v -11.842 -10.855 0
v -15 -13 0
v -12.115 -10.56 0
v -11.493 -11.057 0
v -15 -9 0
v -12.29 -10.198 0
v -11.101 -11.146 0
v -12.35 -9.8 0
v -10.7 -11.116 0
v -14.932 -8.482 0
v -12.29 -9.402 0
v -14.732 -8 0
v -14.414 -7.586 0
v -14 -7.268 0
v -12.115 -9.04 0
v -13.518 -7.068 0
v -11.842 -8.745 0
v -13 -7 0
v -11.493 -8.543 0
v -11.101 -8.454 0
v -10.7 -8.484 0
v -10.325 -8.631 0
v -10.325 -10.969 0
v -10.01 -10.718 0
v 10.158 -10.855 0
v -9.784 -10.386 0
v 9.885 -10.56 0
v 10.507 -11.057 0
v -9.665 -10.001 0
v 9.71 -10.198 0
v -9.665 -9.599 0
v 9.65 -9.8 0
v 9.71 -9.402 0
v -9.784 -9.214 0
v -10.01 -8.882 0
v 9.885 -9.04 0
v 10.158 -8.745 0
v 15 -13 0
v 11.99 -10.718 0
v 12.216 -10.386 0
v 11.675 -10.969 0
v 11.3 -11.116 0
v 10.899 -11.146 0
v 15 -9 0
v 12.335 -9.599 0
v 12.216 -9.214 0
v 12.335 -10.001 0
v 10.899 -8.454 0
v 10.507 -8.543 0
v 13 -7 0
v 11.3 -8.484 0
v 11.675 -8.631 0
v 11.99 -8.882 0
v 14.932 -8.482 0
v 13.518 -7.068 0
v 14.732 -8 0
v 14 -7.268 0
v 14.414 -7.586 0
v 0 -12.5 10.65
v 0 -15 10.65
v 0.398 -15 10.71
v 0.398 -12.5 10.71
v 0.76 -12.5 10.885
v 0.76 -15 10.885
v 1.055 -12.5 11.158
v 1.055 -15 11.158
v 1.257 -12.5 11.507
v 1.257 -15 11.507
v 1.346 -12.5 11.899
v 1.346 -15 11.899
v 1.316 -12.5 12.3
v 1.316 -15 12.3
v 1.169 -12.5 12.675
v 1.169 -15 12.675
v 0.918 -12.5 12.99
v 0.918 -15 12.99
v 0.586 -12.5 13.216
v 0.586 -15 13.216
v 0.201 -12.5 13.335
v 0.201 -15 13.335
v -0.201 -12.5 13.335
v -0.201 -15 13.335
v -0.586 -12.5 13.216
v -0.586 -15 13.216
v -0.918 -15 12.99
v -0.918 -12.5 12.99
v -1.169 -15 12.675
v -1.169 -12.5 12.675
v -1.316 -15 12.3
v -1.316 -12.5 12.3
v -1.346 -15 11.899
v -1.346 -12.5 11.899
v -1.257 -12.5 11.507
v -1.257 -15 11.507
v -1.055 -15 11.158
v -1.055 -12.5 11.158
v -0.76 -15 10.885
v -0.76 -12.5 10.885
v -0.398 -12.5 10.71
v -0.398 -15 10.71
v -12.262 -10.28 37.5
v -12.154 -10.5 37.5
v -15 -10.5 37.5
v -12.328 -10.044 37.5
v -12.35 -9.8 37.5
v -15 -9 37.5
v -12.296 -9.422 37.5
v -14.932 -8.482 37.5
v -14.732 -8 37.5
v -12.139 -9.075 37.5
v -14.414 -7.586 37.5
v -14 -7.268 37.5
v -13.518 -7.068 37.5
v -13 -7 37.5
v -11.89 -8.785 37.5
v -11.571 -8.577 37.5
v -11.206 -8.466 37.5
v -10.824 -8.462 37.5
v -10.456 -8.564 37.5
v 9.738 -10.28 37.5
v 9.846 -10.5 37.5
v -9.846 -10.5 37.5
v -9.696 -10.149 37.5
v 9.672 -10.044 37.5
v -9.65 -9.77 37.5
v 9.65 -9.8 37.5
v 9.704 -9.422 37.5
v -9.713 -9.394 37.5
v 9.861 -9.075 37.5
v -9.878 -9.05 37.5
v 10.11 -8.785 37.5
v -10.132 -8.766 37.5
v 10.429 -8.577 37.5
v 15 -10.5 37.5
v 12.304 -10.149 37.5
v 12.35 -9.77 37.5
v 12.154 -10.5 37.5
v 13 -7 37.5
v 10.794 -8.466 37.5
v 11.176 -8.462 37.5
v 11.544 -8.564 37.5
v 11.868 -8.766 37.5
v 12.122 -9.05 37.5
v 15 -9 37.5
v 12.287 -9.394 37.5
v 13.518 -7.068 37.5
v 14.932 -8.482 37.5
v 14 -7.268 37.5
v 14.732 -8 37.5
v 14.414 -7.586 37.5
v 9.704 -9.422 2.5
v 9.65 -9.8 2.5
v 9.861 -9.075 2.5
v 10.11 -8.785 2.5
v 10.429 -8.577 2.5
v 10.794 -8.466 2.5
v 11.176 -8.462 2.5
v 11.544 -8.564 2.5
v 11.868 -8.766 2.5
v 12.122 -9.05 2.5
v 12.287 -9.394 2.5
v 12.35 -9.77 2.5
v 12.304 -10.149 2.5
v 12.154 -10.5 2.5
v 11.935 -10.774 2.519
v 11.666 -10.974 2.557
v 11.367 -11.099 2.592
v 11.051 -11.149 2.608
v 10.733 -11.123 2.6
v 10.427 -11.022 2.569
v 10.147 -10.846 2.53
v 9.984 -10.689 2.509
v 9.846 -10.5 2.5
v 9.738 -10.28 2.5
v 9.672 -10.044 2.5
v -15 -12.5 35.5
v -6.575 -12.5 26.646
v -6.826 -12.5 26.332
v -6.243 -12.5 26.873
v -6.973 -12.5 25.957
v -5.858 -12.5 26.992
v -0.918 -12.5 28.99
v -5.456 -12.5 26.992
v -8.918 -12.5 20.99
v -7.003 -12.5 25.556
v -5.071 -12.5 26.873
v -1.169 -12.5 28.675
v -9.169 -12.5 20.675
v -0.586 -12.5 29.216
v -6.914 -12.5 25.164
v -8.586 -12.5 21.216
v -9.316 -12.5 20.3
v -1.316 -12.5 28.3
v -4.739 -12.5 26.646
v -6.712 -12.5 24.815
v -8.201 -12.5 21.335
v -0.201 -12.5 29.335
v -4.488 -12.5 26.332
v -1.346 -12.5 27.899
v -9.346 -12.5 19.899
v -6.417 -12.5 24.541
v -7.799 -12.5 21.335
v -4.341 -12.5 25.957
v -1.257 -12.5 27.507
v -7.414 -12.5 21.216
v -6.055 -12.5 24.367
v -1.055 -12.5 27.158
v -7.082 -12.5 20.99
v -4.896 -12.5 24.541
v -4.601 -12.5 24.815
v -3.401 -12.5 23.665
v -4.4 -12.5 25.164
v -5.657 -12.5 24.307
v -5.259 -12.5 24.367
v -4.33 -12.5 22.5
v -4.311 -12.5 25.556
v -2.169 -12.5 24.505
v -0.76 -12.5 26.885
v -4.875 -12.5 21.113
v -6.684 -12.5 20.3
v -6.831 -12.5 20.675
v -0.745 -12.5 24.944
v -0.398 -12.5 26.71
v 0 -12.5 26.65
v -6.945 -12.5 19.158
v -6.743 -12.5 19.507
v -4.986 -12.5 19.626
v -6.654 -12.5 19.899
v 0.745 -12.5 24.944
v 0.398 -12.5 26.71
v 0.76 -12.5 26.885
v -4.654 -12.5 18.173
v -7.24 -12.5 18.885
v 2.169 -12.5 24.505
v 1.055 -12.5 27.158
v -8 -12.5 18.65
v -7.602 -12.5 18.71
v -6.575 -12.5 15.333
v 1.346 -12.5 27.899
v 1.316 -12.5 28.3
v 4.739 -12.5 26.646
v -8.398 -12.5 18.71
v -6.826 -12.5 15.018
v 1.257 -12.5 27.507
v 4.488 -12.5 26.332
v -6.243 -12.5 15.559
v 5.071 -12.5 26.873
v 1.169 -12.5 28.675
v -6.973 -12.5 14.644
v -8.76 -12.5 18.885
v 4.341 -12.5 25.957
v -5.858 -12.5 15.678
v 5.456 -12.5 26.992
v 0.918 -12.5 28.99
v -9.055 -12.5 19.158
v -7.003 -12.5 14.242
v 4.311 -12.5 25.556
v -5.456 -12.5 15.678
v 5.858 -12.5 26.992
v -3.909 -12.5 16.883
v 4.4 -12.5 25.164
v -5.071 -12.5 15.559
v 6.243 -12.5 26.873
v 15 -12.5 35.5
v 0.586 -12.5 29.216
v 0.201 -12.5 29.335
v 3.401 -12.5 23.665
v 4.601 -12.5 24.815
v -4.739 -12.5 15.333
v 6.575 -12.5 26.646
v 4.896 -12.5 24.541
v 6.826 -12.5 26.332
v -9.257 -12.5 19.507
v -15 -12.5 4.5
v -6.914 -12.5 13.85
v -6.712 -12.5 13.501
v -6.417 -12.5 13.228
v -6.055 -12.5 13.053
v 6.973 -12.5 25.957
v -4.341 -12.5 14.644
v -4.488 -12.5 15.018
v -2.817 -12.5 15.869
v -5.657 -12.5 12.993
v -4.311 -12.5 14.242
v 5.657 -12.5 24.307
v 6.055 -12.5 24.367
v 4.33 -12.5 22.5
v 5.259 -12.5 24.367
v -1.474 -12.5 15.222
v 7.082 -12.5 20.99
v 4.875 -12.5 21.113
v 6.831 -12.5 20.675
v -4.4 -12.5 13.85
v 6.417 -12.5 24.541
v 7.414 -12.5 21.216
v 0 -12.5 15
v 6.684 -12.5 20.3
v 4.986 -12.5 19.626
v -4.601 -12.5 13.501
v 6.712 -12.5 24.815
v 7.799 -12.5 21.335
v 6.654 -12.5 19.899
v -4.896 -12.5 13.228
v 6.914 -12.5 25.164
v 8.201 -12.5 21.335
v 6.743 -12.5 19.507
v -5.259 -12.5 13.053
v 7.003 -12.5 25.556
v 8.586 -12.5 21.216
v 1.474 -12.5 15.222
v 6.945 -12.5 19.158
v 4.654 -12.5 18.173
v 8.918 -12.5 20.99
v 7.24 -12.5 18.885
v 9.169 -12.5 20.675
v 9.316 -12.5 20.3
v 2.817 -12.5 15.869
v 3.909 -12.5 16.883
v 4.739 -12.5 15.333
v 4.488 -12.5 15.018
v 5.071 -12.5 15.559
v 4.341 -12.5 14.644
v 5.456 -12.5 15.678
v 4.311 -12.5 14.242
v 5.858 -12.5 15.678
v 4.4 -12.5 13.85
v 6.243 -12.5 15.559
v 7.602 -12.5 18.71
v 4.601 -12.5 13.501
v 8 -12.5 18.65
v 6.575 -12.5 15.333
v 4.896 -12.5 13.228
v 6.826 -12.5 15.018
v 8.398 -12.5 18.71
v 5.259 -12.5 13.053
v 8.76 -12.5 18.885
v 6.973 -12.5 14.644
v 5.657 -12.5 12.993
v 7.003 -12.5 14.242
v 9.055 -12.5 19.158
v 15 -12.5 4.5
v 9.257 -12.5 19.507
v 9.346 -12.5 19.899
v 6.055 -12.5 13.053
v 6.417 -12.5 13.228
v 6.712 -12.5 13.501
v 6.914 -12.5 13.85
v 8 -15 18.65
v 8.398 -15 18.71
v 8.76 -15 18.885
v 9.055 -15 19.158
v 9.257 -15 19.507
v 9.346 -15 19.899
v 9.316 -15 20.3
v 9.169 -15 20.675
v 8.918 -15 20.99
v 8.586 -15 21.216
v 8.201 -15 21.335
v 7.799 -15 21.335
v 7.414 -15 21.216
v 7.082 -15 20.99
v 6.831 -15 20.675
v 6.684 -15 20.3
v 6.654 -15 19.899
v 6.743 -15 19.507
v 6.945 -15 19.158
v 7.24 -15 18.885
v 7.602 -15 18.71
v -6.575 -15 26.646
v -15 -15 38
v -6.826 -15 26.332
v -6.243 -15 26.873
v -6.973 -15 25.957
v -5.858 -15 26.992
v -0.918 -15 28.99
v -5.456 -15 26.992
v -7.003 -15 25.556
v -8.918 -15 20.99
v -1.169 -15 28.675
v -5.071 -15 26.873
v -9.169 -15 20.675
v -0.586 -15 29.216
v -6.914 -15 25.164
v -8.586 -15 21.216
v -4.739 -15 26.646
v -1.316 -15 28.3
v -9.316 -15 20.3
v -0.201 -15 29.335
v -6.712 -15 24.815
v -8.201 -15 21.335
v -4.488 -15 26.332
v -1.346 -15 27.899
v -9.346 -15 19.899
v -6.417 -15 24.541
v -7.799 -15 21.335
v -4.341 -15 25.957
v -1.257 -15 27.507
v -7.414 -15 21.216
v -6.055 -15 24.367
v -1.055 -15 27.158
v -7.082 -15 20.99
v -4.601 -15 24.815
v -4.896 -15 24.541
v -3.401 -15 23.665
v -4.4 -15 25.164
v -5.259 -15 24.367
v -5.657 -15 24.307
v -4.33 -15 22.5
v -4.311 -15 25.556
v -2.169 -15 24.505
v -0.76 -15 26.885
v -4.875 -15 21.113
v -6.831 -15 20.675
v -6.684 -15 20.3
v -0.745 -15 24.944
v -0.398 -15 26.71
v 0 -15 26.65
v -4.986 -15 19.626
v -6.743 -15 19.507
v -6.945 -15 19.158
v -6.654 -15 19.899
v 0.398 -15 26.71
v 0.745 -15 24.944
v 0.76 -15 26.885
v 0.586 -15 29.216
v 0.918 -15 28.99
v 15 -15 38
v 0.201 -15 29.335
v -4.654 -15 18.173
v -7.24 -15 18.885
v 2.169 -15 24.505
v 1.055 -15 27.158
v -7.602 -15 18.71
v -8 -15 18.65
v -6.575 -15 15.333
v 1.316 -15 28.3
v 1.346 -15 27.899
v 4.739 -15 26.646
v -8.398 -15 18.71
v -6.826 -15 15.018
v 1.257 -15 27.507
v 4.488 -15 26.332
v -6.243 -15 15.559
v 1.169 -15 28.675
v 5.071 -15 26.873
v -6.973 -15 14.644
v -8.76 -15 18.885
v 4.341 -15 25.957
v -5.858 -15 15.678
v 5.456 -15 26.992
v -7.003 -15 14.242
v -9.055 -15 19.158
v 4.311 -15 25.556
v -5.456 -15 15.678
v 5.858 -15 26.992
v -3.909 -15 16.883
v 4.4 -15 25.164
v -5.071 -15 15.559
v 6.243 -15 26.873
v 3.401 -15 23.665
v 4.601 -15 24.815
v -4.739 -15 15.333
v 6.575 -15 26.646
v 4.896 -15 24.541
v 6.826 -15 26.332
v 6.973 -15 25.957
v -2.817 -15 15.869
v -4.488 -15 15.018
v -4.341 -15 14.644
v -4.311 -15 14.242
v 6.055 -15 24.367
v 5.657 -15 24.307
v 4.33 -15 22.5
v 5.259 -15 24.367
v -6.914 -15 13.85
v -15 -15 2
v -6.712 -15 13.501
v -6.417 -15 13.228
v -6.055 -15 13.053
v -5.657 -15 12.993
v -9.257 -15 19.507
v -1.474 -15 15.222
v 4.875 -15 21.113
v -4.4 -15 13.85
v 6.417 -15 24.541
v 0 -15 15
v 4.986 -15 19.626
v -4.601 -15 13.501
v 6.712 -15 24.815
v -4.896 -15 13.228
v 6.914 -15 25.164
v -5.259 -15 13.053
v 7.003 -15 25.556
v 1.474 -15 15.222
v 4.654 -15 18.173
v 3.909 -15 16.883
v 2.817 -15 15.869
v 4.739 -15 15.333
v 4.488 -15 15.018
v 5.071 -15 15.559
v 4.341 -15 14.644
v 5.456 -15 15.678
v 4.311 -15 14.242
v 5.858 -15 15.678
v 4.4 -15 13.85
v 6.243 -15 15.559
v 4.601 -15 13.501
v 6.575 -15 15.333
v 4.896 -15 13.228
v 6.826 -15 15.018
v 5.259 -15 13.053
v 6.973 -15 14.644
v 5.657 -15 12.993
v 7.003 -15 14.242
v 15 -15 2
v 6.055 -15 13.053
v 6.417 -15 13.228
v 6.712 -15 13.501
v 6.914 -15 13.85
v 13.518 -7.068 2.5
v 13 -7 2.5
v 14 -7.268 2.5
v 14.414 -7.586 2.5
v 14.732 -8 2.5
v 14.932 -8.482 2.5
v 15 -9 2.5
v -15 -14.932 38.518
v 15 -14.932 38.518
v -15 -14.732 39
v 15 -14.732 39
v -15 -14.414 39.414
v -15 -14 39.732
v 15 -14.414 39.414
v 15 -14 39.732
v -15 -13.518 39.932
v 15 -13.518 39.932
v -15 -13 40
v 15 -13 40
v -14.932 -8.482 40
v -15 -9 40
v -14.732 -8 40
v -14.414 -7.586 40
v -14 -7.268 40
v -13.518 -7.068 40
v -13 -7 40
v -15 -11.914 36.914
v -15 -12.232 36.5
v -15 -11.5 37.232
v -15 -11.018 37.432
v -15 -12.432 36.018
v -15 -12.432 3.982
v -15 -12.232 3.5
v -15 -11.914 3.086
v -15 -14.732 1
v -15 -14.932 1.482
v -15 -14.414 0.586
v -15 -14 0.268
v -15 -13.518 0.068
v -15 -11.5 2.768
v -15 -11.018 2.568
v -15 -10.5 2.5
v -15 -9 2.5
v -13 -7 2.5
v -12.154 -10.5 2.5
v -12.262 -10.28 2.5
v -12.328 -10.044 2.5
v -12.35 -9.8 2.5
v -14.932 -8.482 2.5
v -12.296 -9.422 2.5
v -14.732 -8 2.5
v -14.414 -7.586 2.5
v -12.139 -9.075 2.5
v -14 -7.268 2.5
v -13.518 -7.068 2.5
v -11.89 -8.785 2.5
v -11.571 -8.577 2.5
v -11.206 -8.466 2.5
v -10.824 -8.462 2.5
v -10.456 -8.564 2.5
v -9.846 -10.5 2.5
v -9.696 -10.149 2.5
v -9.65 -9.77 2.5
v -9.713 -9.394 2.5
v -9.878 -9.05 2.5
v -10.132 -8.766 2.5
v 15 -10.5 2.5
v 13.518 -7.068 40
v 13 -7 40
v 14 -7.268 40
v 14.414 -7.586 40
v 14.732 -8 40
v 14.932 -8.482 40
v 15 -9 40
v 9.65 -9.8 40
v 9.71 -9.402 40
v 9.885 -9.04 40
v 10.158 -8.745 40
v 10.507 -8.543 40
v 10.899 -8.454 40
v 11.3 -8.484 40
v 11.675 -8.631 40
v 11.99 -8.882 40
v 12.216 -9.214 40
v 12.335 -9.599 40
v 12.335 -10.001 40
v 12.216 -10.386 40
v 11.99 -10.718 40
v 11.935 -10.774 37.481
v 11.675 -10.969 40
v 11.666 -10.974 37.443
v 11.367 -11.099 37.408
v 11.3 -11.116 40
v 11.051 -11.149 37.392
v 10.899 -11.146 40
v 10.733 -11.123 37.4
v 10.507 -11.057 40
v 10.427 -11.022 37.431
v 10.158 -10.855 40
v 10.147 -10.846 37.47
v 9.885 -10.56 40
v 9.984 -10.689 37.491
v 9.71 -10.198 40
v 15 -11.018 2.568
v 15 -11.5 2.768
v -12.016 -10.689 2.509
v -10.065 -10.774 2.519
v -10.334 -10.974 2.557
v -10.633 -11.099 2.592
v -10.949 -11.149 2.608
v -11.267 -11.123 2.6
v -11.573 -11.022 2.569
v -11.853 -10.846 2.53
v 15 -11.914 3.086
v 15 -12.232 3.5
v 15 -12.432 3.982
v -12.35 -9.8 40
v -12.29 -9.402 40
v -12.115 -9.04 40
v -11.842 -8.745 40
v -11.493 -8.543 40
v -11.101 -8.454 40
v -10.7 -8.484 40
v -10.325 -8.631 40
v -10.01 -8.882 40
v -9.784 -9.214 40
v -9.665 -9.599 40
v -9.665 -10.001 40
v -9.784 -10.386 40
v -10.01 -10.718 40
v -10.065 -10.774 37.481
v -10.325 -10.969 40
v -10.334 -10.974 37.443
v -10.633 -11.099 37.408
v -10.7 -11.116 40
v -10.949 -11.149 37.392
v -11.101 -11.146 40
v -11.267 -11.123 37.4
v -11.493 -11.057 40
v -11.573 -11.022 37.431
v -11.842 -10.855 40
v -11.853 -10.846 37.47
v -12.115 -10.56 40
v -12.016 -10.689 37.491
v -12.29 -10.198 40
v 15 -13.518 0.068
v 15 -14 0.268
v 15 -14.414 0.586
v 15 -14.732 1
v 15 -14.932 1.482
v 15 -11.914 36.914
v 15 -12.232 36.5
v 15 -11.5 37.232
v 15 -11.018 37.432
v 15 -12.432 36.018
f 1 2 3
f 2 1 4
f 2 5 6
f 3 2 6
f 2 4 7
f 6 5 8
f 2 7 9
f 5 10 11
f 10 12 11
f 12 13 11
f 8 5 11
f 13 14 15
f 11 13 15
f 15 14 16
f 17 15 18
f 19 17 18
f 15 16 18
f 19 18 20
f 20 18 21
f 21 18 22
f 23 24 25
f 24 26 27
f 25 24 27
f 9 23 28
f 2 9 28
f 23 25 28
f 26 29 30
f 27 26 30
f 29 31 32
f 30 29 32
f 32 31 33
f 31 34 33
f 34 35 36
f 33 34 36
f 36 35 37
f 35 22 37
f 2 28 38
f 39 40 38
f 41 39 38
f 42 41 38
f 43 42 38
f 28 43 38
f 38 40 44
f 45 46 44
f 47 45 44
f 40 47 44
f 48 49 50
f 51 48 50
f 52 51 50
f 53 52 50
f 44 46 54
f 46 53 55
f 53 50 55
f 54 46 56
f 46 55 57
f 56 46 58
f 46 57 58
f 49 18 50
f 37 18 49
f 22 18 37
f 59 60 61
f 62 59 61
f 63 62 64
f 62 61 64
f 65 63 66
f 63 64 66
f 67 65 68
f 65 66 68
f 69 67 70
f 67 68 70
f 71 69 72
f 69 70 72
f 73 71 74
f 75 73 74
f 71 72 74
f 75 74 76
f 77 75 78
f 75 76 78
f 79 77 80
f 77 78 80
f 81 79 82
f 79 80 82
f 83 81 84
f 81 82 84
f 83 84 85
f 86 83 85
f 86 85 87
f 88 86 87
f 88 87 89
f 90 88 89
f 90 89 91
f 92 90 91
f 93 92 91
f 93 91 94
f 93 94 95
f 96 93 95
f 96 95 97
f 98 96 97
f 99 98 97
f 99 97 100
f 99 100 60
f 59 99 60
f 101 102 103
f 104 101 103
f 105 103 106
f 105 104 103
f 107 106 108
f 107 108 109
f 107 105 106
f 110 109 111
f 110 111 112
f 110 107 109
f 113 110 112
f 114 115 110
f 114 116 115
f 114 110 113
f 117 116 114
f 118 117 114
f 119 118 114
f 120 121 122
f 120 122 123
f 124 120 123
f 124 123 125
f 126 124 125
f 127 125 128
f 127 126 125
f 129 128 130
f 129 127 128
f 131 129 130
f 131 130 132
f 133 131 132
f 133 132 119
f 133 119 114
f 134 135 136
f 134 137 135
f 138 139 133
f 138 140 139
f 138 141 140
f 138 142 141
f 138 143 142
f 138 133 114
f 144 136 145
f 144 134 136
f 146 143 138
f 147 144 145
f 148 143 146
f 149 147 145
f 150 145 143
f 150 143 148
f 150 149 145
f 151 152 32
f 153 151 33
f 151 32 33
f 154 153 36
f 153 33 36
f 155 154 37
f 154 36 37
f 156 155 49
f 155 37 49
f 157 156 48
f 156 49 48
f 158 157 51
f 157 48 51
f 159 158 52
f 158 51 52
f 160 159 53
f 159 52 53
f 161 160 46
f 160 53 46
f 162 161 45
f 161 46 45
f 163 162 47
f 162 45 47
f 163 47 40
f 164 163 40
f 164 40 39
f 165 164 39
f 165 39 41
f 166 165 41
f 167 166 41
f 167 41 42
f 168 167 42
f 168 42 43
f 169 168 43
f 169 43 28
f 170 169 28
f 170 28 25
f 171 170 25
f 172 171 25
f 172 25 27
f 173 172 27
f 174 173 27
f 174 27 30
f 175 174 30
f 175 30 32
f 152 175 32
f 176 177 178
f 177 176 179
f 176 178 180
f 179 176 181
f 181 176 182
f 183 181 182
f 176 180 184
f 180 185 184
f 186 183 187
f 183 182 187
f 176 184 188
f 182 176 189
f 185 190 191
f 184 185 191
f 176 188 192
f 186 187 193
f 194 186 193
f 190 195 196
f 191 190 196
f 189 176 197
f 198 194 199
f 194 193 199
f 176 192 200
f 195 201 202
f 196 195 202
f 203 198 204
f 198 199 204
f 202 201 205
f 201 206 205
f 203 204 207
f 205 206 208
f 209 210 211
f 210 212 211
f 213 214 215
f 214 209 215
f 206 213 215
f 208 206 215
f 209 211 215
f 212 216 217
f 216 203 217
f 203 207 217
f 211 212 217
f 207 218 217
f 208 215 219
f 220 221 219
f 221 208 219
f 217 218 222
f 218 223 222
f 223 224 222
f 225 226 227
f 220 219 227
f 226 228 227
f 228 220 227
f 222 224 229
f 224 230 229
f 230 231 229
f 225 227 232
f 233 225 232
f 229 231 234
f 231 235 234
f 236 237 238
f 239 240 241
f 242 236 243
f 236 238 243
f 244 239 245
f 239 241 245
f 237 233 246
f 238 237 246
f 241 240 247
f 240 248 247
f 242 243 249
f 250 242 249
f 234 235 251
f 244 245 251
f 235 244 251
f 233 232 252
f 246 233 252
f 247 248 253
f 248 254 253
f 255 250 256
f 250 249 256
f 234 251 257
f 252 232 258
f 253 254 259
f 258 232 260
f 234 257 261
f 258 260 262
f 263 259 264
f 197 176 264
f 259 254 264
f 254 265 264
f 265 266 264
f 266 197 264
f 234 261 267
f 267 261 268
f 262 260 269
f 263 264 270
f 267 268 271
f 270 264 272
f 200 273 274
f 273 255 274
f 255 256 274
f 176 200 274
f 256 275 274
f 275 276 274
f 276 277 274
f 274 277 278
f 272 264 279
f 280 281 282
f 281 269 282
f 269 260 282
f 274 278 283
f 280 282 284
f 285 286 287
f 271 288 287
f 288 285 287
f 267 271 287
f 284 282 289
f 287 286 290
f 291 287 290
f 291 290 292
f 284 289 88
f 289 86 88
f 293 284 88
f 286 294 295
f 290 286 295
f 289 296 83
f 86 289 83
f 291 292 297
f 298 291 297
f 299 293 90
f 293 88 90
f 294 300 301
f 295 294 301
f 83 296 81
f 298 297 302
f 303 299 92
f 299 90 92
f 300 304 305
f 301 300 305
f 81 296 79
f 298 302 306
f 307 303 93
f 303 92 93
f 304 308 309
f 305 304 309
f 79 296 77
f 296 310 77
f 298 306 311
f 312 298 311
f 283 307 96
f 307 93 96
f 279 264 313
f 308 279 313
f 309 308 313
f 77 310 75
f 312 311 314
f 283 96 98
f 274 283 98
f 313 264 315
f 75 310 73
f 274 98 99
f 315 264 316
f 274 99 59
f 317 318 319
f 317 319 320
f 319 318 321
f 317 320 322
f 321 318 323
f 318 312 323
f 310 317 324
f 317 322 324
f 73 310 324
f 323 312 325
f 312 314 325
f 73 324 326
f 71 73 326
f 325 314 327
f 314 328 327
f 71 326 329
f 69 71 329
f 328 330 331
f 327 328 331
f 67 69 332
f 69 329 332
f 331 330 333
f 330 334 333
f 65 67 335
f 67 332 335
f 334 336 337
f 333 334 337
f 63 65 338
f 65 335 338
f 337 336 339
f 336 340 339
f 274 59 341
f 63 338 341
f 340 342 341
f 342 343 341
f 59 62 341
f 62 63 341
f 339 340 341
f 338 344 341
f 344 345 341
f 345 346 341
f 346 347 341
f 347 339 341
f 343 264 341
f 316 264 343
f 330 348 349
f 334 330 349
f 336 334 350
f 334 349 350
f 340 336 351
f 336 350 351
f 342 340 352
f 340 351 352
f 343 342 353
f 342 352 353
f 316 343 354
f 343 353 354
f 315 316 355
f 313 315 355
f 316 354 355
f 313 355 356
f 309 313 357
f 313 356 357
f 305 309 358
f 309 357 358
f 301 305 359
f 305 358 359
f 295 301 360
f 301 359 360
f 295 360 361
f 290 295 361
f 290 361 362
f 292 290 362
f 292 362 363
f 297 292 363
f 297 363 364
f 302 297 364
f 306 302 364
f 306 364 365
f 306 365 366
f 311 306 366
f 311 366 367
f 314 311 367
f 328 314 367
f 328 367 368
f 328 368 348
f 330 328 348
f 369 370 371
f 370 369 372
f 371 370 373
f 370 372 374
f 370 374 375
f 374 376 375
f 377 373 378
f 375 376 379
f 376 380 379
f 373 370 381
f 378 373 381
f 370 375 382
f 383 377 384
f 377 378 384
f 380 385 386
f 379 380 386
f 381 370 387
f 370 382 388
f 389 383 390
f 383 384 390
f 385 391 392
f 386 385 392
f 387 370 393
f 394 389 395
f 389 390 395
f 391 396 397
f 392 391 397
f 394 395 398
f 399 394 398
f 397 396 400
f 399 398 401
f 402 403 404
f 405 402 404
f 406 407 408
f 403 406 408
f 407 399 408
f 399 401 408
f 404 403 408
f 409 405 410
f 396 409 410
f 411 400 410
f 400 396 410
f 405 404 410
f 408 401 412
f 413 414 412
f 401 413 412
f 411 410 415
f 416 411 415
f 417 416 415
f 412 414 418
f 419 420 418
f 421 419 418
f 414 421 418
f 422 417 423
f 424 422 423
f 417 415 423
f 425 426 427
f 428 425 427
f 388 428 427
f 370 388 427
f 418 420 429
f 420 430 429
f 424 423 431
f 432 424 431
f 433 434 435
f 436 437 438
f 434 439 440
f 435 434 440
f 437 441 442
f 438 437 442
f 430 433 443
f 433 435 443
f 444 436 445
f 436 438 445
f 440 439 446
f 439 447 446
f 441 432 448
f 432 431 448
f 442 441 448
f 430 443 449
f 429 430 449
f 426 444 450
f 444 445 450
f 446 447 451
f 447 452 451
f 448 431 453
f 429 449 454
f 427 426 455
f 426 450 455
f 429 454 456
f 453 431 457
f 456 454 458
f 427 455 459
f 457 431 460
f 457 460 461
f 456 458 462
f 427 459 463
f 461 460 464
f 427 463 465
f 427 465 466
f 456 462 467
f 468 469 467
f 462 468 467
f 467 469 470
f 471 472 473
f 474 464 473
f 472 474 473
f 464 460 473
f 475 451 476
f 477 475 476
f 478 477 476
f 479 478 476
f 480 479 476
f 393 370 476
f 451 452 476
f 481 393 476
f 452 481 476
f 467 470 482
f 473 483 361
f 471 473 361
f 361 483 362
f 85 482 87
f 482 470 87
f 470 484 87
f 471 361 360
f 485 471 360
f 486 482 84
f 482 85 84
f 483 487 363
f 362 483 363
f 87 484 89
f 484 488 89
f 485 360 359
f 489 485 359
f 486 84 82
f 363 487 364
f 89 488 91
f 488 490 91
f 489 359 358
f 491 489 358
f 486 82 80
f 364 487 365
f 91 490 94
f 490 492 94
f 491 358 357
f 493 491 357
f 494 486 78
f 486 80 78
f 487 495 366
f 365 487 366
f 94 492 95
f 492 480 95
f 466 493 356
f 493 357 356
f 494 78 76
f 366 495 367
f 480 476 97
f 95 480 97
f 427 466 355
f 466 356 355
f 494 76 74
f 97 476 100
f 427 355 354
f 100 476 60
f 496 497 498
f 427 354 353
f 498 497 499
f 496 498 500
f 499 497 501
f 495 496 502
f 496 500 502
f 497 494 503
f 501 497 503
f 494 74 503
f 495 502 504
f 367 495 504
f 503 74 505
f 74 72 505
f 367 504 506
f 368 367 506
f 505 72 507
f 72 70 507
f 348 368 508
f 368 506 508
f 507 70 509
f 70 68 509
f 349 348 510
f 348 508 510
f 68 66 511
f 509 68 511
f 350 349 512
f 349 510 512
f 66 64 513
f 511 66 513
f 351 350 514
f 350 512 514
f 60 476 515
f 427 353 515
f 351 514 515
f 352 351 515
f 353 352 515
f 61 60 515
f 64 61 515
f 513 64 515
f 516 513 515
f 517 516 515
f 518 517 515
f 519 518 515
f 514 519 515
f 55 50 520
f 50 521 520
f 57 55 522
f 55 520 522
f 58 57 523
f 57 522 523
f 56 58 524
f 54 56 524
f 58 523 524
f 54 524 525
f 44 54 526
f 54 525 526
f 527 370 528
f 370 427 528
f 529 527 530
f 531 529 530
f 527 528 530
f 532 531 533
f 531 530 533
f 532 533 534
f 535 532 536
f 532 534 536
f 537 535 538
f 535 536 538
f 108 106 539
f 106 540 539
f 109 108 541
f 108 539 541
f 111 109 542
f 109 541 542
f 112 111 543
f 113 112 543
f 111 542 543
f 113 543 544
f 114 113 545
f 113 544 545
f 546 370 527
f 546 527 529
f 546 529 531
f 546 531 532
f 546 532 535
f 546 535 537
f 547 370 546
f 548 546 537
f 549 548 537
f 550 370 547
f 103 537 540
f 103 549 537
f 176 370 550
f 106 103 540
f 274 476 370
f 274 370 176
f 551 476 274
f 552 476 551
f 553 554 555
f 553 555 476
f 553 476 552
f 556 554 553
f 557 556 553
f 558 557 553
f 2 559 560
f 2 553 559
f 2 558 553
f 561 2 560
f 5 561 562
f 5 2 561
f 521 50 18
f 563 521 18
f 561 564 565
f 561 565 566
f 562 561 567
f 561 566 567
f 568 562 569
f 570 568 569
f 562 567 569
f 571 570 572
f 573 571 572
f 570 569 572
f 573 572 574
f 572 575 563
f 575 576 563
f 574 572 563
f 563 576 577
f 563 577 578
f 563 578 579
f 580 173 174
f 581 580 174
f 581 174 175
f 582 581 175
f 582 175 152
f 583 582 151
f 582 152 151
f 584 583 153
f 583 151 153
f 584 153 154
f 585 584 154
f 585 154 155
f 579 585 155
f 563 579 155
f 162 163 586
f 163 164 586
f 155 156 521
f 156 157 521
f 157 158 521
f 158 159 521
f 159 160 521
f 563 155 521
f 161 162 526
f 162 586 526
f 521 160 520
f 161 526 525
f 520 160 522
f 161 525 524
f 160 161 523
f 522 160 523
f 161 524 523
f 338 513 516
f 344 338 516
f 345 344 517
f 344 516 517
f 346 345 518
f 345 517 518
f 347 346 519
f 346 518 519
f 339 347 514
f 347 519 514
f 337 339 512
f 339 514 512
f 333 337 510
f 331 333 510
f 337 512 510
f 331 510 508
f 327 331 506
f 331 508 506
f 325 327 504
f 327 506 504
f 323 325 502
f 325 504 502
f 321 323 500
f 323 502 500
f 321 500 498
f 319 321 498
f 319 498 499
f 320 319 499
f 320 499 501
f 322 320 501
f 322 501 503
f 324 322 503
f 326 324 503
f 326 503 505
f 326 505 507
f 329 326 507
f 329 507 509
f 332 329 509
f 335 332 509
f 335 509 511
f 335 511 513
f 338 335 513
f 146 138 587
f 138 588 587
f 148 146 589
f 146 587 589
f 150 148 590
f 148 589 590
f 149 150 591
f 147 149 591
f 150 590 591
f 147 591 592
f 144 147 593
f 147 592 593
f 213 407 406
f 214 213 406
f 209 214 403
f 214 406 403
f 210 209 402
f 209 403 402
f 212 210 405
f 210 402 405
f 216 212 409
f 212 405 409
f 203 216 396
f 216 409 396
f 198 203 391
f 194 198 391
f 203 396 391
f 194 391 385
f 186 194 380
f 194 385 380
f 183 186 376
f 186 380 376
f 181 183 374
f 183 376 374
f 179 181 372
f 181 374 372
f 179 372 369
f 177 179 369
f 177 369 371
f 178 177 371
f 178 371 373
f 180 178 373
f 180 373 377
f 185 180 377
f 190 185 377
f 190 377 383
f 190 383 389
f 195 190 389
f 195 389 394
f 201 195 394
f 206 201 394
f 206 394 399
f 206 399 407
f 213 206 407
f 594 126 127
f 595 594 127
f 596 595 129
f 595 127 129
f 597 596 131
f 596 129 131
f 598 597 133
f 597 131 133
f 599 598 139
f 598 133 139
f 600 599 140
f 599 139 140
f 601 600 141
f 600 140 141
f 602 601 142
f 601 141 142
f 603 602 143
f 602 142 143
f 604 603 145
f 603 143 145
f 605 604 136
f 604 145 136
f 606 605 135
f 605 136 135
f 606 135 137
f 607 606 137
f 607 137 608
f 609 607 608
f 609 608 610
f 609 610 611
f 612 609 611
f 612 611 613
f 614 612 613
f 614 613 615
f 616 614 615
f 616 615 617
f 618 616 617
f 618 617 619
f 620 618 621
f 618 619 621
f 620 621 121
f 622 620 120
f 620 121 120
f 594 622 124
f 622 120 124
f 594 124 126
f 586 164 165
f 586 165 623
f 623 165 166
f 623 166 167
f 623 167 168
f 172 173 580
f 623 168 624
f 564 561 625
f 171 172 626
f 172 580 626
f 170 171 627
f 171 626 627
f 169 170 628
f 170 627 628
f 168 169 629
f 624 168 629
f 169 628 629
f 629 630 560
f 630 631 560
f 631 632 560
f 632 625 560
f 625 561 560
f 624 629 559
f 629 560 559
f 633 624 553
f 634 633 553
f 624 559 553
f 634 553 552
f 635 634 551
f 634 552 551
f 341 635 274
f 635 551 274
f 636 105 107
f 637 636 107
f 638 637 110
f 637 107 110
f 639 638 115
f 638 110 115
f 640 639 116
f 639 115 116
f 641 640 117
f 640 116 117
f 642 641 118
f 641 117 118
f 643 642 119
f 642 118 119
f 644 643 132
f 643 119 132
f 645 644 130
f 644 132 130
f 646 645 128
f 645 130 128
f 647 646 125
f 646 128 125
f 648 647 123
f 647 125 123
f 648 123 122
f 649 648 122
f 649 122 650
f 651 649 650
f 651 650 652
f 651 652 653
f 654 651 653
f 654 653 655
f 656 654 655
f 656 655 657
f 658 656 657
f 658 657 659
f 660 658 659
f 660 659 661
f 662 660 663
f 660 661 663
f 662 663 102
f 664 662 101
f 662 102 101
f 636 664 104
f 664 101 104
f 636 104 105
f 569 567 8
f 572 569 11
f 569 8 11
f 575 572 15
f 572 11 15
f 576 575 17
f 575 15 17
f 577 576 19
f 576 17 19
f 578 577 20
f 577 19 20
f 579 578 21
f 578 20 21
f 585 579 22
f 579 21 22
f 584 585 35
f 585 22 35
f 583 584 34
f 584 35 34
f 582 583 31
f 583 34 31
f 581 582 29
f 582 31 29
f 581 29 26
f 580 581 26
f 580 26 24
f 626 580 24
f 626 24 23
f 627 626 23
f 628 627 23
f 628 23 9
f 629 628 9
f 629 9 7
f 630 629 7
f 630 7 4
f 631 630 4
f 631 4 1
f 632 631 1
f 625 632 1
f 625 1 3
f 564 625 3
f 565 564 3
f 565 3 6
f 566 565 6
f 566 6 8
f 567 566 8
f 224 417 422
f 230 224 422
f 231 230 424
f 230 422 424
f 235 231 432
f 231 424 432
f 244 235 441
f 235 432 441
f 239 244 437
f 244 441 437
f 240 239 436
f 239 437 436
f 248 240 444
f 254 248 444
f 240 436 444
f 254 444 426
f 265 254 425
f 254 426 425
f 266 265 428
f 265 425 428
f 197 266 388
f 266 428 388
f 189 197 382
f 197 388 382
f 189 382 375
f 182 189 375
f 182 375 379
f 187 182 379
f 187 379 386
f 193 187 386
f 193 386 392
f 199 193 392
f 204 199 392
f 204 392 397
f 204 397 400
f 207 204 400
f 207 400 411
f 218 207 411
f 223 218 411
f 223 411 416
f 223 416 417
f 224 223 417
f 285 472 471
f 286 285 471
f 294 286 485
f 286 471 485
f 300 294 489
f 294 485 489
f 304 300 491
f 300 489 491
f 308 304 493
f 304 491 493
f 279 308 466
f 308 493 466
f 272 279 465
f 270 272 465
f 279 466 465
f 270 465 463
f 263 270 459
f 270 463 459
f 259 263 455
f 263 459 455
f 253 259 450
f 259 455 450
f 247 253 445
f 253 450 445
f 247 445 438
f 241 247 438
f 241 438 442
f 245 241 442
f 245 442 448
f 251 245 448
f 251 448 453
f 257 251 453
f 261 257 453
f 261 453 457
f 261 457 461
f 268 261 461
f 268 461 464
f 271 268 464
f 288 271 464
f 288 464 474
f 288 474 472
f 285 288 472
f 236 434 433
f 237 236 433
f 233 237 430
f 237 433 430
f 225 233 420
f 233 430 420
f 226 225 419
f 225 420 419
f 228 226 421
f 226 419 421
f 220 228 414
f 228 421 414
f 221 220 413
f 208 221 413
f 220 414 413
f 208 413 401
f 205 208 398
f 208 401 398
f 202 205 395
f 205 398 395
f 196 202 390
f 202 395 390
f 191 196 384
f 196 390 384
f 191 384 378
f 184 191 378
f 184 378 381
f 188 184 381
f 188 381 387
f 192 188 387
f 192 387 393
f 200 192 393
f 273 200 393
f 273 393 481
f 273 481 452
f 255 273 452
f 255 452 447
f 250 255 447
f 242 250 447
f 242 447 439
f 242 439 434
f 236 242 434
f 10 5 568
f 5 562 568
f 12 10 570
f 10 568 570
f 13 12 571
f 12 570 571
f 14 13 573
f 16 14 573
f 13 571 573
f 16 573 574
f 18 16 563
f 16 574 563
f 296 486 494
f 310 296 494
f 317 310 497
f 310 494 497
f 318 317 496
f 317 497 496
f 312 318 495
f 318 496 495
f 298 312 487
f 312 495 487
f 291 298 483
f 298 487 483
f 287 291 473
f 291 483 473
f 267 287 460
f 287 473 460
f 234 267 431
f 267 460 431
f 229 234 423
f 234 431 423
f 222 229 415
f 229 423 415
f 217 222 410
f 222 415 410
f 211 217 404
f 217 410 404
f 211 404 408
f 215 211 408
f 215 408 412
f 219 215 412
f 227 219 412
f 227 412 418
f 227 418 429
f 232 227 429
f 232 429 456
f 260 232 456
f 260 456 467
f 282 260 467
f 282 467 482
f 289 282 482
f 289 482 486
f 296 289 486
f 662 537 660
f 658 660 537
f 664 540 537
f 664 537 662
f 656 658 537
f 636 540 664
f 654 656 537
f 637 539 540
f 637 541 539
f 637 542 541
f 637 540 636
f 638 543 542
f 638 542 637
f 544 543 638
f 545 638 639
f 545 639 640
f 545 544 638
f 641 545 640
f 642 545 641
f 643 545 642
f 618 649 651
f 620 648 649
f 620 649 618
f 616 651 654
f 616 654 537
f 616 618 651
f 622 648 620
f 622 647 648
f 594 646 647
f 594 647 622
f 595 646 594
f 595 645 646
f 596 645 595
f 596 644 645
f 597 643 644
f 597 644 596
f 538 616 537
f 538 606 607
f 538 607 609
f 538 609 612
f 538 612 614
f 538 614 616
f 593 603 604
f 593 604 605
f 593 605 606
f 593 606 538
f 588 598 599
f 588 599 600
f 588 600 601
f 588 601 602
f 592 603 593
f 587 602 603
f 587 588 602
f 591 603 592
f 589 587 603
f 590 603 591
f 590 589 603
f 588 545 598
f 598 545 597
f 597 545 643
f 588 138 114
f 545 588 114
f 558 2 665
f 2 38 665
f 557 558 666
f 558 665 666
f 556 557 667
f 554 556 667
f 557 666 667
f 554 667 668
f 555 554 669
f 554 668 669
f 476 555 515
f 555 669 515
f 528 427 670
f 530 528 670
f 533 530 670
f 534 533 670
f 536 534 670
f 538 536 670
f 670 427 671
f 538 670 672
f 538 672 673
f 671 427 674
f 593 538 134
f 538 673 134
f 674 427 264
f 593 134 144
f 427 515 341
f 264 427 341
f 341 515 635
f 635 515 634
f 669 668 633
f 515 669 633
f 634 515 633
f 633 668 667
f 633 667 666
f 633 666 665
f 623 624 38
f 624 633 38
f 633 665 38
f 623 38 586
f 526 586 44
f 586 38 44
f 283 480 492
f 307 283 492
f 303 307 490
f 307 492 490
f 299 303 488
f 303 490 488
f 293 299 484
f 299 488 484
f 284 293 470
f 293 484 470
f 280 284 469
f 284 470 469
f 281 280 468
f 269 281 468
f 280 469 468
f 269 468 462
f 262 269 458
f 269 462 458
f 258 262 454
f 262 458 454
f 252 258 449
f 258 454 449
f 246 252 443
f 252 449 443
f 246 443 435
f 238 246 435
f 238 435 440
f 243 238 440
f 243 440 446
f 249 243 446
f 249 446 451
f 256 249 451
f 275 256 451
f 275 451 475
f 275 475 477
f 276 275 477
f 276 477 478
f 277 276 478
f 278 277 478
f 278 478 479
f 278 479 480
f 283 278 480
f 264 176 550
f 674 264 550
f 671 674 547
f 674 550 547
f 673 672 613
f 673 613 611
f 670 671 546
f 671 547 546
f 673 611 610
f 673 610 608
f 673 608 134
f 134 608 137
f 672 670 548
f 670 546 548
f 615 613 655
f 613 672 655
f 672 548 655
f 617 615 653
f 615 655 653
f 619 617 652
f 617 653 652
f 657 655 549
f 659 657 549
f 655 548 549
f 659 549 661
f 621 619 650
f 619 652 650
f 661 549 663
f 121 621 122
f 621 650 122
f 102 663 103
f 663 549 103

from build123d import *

# Parameters (mm, degrees)
ESBO_O1_W                = 30
ESBO_O1_H                = 30
RESSALTO_EXTRUS_O1_DEPTH = 40
ESBO_O2_W                = 35
ESBO_O2_H                = 27.5
CORTE_EXTRUS_O1_DEPTH    = 40
FILETE1_R                = 2
FILETE2_R                = 2
ESBO_O4_R                = 5
CORTE_EXTRUS_O3_DEPTH    = 53.201532545
ESBO_O5_R                = 1.35
CORTE_EXTRUS_O5_DEPTH    = 53.201532545
ESBO_O7_R                = 1.35
CORTE_EXTRUS_O6_DEPTH    = 46.276925691
ESBO_O8_W                = 30
ESBO_O8_H                = 22
CORTE_EXTRUS_O8_DEPTH    = 46.276925691
FILETE3_R                = 2
ESBO_O10_R               = 1.35
CORTE_EXTRUS_O9_DEPTH    = 46.276925691


with BuildPart() as part:
    # Esboço1 → Ressalto-extrusão1 (new body)
    with BuildSketch(Plane.XY):
        Rectangle(ESBO_O1_W, ESBO_O1_H)
    extrude(amount=RESSALTO_EXTRUS_O1_DEPTH)

    # Esboço2 → Corte-extrusão1 (cut)
    with BuildSketch(Plane(origin=(15, 0, 0), x_dir=(0, 0, -1), z_dir=(1, 0, 0))):
        with Locations((-20, 1.25)):
            Rectangle(ESBO_O2_W, ESBO_O2_H)
    extrude(amount=-CORTE_EXTRUS_O1_DEPTH, mode=Mode.SUBTRACT)

    # Filete1
    filete1_edges = [part.edges().sort_by_distance(p)[0] for p in [
        (-15, 15, 1.25),
        (15, 15, 1.25),
        (-15, 15, 38.75),
        (15, 15, 38.75),
    ]]
    fillet(filete1_edges, radius=FILETE1_R)

    # Filete2
    filete2_edges = [part.edges().sort_by_distance(p)[0] for p in [
        (0, -15, 40),
        (0, -12.5, 2.5),
        (0, -12.5, 37.5),
        (0, -15, 0),
    ]]
    fillet(filete2_edges, radius=FILETE2_R)

    # Esboço4 → Corte-extrusão3 (cut, through all)
    with BuildSketch(Plane(origin=(0, -15, 0), x_dir=(-1, 0, 0), z_dir=(0, -1, 0))):
        with Locations(Location((0, -20, 0), (0, 0, 90))):
            Circle(ESBO_O4_R)
    extrude(amount=-CORTE_EXTRUS_O3_DEPTH, mode=Mode.SUBTRACT)

    # Esboço5 → Corte-extrusão5 (cut, through all)
    with BuildSketch(Plane(origin=(0, -15, 0), x_dir=(-1, 0, 0), z_dir=(0, -1, 0))):
        with Locations(Location((0, -28, 0), (0, 0, 90))):
            Circle(ESBO_O5_R)
        with Locations(Location((-5.656854249, -25.656854249, 0), (0, 0, 90))):
            Circle(ESBO_O5_R)
        with Locations(Location((-8, -20, 0), (0, 0, 90))):
            Circle(ESBO_O5_R)
        with Locations(Location((-5.656854251, -14.343145752, 0), (0, 0, 90))):
            Circle(ESBO_O5_R)
        with Locations(Location((0, -12, 0), (0, 0, 90))):
            Circle(ESBO_O5_R)
        with Locations(Location((5.656854251, -14.343145752, 0), (0, 0, 90))):
            Circle(ESBO_O5_R)
        with Locations(Location((8, -20, 0), (0, 0, 90))):
            Circle(ESBO_O5_R)
        with Locations(Location((5.656854249, -25.656854249, 0), (0, 0, 90))):
            Circle(ESBO_O5_R)
    extrude(amount=-CORTE_EXTRUS_O5_DEPTH, mode=Mode.SUBTRACT)

    # Esboço7 → Corte-extrusão6 (cut, through all)
    with BuildSketch(Plane(origin=(0, 0, 0), x_dir=(-1, 0, 0), z_dir=(0, 0, -1))):
        with Locations((-11, 12.2)):
            Circle(ESBO_O7_R)
        with Locations((11, 12.2)):
            Circle(ESBO_O7_R)
    extrude(amount=-CORTE_EXTRUS_O6_DEPTH, mode=Mode.SUBTRACT)

    # Esboço8 → Corte-extrusão8 (cut, through all)
    with BuildSketch(Plane(origin=(0, 0, 0), x_dir=(-1, 0, 0), z_dir=(0, 0, -1))):
        with Locations((0, 4)):
            Rectangle(ESBO_O8_W, ESBO_O8_H)
    extrude(amount=-CORTE_EXTRUS_O8_DEPTH, mode=Mode.SUBTRACT)

    # Filete3
    filete3_edges = [part.edges().sort_by_distance(p)[0] for p in [
        (-15, -7, 38.75),
        (-15, -7, 1.25),
        (15, -7, 38.75),
        (15, -7, 1.25),
    ]]
    fillet(filete3_edges, radius=FILETE3_R)

    # Esboço10 → Corte-extrusão9 (cut, through all)
    with BuildSketch(Plane(origin=(0, 0, 0), x_dir=(-1, 0, 0), z_dir=(0, 0, -1))):
        with Locations((-11, -9.8)):
            Circle(ESBO_O10_R)
        with Locations((11, -9.8)):
            Circle(ESBO_O10_R)
    extrude(amount=-CORTE_EXTRUS_O9_DEPTH, mode=Mode.SUBTRACT)


solid = part.part
